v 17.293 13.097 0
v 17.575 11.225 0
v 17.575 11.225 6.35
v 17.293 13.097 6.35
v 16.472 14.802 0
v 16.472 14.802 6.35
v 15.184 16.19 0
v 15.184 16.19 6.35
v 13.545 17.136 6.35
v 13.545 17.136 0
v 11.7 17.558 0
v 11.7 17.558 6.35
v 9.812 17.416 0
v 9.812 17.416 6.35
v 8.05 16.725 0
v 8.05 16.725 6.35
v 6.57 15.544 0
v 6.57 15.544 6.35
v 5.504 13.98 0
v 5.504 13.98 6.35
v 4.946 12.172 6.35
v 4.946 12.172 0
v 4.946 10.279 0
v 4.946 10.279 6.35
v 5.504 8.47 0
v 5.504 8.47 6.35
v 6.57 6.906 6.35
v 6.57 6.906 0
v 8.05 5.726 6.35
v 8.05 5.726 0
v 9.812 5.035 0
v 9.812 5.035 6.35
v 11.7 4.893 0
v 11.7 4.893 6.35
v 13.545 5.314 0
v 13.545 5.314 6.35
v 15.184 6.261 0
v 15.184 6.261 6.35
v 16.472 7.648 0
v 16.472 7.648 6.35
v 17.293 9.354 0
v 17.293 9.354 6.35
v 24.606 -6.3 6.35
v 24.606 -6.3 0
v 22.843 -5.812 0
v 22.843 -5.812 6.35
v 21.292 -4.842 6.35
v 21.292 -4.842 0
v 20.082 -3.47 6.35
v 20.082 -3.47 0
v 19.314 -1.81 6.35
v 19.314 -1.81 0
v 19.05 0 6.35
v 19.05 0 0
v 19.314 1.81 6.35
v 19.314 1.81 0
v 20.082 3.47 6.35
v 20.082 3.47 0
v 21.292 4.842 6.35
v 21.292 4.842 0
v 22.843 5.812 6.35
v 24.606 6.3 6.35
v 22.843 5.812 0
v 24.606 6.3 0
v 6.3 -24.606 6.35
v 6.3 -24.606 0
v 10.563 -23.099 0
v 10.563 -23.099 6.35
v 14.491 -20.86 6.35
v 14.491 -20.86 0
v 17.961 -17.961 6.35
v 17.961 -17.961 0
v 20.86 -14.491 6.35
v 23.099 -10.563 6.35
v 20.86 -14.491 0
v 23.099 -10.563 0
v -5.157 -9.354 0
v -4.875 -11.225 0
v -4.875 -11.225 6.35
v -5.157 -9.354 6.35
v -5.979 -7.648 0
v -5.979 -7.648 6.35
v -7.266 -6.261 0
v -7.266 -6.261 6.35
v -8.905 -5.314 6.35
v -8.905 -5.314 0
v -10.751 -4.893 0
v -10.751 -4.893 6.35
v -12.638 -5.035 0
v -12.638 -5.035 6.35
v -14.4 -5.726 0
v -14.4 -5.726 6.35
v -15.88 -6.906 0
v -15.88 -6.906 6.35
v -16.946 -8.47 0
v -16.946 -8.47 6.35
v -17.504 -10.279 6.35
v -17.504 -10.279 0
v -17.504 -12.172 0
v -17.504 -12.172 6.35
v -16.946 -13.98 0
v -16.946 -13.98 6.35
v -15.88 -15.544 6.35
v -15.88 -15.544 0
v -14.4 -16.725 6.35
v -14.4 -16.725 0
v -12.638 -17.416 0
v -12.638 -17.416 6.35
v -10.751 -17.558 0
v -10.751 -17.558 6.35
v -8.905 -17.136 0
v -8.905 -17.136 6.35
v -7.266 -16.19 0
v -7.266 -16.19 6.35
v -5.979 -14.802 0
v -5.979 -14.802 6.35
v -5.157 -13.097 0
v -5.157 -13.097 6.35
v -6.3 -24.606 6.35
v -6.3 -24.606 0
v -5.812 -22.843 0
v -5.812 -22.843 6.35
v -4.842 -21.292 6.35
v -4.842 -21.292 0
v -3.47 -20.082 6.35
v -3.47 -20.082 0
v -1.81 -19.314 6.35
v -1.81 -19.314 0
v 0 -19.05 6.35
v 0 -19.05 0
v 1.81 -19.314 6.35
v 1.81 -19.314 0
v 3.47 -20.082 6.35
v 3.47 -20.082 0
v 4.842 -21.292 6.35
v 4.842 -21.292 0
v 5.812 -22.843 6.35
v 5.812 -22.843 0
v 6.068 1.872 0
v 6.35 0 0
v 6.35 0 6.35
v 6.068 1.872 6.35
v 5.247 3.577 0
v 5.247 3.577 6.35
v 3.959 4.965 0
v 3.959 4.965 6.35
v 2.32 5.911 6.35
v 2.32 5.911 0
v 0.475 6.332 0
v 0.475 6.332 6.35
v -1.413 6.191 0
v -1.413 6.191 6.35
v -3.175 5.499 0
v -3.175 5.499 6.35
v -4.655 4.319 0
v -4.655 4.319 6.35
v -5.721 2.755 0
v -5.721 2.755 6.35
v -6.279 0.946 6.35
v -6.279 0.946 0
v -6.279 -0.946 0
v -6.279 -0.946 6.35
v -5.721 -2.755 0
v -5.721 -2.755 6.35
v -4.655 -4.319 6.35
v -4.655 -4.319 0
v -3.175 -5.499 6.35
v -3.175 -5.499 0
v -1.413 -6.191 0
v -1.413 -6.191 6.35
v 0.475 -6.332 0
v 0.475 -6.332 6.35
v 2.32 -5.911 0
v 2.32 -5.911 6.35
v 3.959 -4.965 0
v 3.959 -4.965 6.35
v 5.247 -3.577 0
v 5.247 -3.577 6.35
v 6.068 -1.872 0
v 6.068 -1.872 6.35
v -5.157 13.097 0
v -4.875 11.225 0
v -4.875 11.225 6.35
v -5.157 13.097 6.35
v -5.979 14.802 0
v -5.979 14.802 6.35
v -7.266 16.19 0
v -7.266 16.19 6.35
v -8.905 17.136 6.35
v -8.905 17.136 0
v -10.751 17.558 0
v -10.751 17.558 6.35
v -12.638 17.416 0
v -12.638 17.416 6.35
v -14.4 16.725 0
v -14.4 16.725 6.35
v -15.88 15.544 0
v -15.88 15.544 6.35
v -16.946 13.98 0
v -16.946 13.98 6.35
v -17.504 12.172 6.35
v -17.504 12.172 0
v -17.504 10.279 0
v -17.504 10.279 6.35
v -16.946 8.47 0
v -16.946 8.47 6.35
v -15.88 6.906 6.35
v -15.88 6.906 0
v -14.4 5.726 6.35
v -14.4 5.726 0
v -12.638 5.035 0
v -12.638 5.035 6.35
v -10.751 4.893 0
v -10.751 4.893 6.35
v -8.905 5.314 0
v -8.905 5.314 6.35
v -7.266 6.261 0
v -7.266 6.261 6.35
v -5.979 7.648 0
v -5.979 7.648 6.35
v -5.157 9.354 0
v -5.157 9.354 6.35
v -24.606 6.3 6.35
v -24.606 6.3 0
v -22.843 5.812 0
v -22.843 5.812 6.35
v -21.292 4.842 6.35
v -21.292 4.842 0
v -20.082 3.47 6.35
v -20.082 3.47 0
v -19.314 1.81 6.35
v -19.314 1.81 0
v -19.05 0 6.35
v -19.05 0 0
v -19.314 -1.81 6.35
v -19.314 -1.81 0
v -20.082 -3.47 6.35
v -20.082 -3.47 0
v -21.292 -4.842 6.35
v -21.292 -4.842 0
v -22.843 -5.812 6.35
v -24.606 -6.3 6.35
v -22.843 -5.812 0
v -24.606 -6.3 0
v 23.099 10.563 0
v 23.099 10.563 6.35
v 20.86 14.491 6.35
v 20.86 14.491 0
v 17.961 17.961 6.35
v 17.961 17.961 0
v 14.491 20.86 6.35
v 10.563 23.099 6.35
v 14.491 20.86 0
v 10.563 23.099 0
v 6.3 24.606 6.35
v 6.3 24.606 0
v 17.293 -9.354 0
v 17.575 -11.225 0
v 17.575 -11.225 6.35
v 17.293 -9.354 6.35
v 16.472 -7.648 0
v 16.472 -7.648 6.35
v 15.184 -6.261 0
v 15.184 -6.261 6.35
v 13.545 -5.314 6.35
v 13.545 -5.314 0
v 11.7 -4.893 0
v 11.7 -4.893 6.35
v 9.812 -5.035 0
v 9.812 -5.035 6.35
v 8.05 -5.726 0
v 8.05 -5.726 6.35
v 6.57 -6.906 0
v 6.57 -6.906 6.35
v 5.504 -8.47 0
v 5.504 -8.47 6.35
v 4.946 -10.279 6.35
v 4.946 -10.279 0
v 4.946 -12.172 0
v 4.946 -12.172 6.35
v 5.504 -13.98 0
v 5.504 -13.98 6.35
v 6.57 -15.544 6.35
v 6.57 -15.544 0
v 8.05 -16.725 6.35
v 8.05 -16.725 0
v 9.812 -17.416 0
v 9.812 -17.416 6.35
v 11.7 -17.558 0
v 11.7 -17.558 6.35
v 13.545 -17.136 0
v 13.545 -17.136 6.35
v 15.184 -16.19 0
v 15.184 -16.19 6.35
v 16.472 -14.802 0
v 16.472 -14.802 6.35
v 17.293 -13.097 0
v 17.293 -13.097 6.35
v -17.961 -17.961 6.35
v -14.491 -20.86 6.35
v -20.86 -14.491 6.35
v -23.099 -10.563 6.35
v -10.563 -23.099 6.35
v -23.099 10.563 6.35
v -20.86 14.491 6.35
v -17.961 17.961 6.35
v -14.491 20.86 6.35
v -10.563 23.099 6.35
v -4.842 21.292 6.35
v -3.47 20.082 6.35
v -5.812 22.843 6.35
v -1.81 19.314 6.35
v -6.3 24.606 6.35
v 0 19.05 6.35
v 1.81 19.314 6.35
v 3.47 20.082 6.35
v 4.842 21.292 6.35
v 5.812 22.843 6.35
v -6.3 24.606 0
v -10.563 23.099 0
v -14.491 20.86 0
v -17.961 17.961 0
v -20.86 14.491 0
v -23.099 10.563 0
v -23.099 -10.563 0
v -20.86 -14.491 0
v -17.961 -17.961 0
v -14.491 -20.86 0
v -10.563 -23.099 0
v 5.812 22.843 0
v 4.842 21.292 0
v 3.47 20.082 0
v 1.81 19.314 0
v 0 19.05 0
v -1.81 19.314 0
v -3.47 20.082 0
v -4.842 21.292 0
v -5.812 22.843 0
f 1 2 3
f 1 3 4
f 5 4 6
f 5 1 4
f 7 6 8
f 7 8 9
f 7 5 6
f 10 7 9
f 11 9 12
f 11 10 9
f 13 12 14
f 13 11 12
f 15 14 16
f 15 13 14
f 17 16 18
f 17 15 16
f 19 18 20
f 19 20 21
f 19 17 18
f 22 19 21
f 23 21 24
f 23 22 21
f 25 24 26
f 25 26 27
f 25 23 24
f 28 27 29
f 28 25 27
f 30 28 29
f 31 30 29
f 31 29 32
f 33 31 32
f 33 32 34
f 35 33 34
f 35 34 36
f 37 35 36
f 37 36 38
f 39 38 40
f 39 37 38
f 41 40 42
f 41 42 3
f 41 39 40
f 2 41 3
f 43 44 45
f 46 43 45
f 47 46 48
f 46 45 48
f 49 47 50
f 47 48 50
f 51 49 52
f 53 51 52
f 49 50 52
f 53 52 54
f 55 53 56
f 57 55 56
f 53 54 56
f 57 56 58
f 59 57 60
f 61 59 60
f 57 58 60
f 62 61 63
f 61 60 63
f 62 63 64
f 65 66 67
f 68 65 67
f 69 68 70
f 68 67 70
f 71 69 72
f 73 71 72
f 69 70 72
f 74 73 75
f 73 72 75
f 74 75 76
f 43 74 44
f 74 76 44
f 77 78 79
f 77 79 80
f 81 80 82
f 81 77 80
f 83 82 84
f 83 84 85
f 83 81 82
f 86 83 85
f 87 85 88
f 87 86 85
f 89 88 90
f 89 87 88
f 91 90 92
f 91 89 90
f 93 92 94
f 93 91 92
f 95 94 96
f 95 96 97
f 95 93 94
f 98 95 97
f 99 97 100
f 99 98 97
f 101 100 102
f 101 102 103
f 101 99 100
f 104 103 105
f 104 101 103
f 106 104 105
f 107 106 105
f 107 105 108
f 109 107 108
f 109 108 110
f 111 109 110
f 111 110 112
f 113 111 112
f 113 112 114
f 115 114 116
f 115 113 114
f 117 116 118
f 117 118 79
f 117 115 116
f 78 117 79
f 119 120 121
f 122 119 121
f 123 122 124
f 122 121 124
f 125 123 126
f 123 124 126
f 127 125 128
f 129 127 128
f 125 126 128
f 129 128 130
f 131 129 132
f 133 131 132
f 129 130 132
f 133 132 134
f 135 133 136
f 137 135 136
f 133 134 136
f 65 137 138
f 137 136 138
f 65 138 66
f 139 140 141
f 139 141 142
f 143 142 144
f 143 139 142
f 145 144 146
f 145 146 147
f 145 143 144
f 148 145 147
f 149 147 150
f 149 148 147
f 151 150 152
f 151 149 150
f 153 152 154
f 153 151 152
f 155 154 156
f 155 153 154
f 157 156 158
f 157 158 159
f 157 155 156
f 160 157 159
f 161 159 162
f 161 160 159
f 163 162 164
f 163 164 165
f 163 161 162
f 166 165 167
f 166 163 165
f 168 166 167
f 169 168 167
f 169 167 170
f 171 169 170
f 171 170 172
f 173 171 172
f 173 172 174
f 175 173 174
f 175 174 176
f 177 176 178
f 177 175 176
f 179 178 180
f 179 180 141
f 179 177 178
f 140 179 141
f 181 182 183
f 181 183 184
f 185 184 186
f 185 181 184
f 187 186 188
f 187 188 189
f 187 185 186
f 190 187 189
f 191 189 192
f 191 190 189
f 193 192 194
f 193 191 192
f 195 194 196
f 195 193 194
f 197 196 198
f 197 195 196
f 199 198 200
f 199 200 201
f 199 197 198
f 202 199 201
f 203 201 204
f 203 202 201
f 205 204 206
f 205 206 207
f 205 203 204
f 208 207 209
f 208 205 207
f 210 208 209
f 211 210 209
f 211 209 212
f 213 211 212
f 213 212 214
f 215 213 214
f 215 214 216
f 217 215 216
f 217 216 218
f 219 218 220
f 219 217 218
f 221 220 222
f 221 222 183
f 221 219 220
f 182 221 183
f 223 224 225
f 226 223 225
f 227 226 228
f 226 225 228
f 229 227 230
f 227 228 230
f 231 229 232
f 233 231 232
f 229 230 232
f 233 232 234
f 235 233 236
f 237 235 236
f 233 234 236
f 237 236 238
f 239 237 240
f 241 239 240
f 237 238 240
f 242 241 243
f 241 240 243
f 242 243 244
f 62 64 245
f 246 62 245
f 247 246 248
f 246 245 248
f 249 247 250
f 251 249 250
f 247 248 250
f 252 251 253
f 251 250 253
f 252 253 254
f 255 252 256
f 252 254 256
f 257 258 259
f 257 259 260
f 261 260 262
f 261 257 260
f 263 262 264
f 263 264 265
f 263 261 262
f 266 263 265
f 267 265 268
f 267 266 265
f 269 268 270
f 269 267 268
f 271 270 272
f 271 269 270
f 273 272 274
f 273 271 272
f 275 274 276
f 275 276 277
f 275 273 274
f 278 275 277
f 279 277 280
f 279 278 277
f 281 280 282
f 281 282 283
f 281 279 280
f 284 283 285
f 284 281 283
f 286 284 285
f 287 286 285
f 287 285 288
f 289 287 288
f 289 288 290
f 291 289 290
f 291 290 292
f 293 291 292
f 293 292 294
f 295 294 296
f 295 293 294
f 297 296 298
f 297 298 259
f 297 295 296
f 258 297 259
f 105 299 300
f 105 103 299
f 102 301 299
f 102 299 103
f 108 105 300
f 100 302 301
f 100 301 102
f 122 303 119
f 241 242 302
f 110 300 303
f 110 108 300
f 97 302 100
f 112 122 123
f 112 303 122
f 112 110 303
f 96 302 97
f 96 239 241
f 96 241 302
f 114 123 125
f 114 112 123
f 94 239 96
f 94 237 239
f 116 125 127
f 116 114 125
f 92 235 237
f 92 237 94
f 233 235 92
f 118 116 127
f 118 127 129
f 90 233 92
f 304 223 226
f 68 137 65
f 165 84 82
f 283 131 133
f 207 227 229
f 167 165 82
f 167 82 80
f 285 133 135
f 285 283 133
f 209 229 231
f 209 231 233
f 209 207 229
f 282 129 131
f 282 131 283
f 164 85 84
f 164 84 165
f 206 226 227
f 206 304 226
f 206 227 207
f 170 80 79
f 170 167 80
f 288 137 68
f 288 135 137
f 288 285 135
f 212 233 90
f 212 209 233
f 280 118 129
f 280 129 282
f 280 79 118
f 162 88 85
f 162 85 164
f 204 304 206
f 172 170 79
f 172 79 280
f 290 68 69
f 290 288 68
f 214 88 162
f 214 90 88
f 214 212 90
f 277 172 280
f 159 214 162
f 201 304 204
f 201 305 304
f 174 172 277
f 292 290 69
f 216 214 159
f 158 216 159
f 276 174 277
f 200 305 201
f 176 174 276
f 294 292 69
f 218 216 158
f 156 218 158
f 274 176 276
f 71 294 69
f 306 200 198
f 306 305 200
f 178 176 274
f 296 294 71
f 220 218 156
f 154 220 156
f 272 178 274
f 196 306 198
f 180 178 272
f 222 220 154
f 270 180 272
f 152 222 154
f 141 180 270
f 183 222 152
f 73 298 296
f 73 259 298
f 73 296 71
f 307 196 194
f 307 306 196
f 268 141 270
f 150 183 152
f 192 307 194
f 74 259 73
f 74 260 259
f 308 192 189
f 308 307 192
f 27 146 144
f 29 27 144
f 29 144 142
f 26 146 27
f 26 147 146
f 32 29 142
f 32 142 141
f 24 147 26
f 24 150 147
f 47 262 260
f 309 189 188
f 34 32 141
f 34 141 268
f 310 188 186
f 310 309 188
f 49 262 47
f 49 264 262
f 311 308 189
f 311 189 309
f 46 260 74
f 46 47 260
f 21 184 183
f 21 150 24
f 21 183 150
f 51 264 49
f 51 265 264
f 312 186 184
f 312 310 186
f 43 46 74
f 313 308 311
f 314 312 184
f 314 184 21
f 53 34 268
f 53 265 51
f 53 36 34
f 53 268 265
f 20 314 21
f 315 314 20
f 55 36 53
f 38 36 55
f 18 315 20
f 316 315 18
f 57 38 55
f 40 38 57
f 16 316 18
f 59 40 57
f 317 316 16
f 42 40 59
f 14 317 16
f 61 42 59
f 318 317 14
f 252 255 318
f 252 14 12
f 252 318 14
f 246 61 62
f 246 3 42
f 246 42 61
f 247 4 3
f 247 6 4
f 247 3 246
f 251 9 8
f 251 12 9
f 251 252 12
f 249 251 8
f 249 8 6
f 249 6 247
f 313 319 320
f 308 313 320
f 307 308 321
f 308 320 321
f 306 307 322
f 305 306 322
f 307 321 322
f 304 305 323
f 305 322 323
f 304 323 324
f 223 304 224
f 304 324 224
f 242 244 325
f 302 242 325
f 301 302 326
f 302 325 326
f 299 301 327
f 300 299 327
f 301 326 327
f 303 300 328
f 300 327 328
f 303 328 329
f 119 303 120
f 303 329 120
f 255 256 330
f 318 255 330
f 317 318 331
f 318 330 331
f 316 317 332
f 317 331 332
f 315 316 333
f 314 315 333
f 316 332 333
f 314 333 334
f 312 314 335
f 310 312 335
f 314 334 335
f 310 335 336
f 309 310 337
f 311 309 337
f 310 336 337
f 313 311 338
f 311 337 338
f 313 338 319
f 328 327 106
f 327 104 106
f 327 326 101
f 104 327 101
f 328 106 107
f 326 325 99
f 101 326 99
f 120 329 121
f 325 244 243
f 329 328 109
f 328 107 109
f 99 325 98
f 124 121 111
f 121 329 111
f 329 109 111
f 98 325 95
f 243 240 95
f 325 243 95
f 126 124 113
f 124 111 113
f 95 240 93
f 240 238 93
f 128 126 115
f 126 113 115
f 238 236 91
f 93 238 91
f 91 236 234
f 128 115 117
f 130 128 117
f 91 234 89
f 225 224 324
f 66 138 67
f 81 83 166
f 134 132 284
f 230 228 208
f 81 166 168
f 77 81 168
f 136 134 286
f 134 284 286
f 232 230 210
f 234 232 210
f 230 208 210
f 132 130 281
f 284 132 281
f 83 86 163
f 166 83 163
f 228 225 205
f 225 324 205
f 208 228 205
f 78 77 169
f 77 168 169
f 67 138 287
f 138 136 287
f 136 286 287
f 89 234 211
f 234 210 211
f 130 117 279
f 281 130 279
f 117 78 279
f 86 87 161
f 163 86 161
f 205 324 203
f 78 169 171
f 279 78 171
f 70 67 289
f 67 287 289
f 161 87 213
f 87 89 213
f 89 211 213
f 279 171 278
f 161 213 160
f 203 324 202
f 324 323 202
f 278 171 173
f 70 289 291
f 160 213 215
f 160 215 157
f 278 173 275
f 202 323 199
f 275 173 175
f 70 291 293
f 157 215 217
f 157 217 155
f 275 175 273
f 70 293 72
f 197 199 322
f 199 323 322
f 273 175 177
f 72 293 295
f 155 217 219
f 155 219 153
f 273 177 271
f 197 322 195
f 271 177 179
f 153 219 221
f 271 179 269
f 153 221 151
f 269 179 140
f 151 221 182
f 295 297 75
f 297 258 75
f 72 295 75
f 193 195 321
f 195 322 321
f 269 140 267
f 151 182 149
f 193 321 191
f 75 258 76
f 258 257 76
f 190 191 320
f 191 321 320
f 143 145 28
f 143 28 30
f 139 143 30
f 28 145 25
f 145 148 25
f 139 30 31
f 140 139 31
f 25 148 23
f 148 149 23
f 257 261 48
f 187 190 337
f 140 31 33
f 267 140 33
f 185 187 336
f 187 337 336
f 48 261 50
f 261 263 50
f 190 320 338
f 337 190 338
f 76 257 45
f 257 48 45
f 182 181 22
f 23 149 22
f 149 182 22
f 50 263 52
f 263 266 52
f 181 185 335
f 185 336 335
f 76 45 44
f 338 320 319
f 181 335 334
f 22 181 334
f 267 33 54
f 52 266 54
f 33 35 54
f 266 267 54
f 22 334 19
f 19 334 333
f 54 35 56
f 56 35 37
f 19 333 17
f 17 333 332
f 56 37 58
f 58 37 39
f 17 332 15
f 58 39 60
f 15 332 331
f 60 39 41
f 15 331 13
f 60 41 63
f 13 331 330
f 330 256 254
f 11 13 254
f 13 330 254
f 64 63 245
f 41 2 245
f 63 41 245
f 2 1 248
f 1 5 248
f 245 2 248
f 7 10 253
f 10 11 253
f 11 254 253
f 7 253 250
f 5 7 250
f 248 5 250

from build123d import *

# Parameters (mm, degrees)
F0_R     = 6.35
F1_DEPTH = 6.35


with BuildPart() as f1:
    # F0 (on Top) → F1 (new body)
    with BuildSketch(Plane.XY):
        with BuildLine():
            ThreePointArc((6.300195, 24.60625), (0, 19.05), (-6.300195, 24.60625))
            ThreePointArc((-6.300195, 24.60625), (-17.960512, 17.960512), (-24.60625, 6.300195))
            ThreePointArc((-24.60625, 6.300195), (-19.05, 0), (-24.60625, -6.300195))
            ThreePointArc((-24.60625, -6.300195), (-17.960512, -17.960512), (-6.300195, -24.60625))
            ThreePointArc((-6.300195, -24.60625), (0, -19.05), (6.300195, -24.60625))
            ThreePointArc((6.300195, -24.60625), (17.960512, -17.960512), (24.60625, -6.300195))
            ThreePointArc((24.60625, -6.300195), (19.05, 0), (24.60625, 6.300195))
            ThreePointArc((24.60625, 6.300195), (17.960512, 17.960512), (6.300195, 24.60625))
        make_face()
        with Locations((-11.22532, -11.22532)):
            Circle(F0_R, mode=Mode.SUBTRACT)
        with Locations((11.22532, -11.22532)):
            Circle(F0_R, mode=Mode.SUBTRACT)
        with Locations((-11.22532, 11.22532)):
            Circle(F0_R, mode=Mode.SUBTRACT)
        Circle(F0_R, mode=Mode.SUBTRACT)
        with Locations((11.22532, 11.22532)):
            Circle(F0_R, mode=Mode.SUBTRACT)
    extrude(amount=F1_DEPTH)


solid = f1.part
